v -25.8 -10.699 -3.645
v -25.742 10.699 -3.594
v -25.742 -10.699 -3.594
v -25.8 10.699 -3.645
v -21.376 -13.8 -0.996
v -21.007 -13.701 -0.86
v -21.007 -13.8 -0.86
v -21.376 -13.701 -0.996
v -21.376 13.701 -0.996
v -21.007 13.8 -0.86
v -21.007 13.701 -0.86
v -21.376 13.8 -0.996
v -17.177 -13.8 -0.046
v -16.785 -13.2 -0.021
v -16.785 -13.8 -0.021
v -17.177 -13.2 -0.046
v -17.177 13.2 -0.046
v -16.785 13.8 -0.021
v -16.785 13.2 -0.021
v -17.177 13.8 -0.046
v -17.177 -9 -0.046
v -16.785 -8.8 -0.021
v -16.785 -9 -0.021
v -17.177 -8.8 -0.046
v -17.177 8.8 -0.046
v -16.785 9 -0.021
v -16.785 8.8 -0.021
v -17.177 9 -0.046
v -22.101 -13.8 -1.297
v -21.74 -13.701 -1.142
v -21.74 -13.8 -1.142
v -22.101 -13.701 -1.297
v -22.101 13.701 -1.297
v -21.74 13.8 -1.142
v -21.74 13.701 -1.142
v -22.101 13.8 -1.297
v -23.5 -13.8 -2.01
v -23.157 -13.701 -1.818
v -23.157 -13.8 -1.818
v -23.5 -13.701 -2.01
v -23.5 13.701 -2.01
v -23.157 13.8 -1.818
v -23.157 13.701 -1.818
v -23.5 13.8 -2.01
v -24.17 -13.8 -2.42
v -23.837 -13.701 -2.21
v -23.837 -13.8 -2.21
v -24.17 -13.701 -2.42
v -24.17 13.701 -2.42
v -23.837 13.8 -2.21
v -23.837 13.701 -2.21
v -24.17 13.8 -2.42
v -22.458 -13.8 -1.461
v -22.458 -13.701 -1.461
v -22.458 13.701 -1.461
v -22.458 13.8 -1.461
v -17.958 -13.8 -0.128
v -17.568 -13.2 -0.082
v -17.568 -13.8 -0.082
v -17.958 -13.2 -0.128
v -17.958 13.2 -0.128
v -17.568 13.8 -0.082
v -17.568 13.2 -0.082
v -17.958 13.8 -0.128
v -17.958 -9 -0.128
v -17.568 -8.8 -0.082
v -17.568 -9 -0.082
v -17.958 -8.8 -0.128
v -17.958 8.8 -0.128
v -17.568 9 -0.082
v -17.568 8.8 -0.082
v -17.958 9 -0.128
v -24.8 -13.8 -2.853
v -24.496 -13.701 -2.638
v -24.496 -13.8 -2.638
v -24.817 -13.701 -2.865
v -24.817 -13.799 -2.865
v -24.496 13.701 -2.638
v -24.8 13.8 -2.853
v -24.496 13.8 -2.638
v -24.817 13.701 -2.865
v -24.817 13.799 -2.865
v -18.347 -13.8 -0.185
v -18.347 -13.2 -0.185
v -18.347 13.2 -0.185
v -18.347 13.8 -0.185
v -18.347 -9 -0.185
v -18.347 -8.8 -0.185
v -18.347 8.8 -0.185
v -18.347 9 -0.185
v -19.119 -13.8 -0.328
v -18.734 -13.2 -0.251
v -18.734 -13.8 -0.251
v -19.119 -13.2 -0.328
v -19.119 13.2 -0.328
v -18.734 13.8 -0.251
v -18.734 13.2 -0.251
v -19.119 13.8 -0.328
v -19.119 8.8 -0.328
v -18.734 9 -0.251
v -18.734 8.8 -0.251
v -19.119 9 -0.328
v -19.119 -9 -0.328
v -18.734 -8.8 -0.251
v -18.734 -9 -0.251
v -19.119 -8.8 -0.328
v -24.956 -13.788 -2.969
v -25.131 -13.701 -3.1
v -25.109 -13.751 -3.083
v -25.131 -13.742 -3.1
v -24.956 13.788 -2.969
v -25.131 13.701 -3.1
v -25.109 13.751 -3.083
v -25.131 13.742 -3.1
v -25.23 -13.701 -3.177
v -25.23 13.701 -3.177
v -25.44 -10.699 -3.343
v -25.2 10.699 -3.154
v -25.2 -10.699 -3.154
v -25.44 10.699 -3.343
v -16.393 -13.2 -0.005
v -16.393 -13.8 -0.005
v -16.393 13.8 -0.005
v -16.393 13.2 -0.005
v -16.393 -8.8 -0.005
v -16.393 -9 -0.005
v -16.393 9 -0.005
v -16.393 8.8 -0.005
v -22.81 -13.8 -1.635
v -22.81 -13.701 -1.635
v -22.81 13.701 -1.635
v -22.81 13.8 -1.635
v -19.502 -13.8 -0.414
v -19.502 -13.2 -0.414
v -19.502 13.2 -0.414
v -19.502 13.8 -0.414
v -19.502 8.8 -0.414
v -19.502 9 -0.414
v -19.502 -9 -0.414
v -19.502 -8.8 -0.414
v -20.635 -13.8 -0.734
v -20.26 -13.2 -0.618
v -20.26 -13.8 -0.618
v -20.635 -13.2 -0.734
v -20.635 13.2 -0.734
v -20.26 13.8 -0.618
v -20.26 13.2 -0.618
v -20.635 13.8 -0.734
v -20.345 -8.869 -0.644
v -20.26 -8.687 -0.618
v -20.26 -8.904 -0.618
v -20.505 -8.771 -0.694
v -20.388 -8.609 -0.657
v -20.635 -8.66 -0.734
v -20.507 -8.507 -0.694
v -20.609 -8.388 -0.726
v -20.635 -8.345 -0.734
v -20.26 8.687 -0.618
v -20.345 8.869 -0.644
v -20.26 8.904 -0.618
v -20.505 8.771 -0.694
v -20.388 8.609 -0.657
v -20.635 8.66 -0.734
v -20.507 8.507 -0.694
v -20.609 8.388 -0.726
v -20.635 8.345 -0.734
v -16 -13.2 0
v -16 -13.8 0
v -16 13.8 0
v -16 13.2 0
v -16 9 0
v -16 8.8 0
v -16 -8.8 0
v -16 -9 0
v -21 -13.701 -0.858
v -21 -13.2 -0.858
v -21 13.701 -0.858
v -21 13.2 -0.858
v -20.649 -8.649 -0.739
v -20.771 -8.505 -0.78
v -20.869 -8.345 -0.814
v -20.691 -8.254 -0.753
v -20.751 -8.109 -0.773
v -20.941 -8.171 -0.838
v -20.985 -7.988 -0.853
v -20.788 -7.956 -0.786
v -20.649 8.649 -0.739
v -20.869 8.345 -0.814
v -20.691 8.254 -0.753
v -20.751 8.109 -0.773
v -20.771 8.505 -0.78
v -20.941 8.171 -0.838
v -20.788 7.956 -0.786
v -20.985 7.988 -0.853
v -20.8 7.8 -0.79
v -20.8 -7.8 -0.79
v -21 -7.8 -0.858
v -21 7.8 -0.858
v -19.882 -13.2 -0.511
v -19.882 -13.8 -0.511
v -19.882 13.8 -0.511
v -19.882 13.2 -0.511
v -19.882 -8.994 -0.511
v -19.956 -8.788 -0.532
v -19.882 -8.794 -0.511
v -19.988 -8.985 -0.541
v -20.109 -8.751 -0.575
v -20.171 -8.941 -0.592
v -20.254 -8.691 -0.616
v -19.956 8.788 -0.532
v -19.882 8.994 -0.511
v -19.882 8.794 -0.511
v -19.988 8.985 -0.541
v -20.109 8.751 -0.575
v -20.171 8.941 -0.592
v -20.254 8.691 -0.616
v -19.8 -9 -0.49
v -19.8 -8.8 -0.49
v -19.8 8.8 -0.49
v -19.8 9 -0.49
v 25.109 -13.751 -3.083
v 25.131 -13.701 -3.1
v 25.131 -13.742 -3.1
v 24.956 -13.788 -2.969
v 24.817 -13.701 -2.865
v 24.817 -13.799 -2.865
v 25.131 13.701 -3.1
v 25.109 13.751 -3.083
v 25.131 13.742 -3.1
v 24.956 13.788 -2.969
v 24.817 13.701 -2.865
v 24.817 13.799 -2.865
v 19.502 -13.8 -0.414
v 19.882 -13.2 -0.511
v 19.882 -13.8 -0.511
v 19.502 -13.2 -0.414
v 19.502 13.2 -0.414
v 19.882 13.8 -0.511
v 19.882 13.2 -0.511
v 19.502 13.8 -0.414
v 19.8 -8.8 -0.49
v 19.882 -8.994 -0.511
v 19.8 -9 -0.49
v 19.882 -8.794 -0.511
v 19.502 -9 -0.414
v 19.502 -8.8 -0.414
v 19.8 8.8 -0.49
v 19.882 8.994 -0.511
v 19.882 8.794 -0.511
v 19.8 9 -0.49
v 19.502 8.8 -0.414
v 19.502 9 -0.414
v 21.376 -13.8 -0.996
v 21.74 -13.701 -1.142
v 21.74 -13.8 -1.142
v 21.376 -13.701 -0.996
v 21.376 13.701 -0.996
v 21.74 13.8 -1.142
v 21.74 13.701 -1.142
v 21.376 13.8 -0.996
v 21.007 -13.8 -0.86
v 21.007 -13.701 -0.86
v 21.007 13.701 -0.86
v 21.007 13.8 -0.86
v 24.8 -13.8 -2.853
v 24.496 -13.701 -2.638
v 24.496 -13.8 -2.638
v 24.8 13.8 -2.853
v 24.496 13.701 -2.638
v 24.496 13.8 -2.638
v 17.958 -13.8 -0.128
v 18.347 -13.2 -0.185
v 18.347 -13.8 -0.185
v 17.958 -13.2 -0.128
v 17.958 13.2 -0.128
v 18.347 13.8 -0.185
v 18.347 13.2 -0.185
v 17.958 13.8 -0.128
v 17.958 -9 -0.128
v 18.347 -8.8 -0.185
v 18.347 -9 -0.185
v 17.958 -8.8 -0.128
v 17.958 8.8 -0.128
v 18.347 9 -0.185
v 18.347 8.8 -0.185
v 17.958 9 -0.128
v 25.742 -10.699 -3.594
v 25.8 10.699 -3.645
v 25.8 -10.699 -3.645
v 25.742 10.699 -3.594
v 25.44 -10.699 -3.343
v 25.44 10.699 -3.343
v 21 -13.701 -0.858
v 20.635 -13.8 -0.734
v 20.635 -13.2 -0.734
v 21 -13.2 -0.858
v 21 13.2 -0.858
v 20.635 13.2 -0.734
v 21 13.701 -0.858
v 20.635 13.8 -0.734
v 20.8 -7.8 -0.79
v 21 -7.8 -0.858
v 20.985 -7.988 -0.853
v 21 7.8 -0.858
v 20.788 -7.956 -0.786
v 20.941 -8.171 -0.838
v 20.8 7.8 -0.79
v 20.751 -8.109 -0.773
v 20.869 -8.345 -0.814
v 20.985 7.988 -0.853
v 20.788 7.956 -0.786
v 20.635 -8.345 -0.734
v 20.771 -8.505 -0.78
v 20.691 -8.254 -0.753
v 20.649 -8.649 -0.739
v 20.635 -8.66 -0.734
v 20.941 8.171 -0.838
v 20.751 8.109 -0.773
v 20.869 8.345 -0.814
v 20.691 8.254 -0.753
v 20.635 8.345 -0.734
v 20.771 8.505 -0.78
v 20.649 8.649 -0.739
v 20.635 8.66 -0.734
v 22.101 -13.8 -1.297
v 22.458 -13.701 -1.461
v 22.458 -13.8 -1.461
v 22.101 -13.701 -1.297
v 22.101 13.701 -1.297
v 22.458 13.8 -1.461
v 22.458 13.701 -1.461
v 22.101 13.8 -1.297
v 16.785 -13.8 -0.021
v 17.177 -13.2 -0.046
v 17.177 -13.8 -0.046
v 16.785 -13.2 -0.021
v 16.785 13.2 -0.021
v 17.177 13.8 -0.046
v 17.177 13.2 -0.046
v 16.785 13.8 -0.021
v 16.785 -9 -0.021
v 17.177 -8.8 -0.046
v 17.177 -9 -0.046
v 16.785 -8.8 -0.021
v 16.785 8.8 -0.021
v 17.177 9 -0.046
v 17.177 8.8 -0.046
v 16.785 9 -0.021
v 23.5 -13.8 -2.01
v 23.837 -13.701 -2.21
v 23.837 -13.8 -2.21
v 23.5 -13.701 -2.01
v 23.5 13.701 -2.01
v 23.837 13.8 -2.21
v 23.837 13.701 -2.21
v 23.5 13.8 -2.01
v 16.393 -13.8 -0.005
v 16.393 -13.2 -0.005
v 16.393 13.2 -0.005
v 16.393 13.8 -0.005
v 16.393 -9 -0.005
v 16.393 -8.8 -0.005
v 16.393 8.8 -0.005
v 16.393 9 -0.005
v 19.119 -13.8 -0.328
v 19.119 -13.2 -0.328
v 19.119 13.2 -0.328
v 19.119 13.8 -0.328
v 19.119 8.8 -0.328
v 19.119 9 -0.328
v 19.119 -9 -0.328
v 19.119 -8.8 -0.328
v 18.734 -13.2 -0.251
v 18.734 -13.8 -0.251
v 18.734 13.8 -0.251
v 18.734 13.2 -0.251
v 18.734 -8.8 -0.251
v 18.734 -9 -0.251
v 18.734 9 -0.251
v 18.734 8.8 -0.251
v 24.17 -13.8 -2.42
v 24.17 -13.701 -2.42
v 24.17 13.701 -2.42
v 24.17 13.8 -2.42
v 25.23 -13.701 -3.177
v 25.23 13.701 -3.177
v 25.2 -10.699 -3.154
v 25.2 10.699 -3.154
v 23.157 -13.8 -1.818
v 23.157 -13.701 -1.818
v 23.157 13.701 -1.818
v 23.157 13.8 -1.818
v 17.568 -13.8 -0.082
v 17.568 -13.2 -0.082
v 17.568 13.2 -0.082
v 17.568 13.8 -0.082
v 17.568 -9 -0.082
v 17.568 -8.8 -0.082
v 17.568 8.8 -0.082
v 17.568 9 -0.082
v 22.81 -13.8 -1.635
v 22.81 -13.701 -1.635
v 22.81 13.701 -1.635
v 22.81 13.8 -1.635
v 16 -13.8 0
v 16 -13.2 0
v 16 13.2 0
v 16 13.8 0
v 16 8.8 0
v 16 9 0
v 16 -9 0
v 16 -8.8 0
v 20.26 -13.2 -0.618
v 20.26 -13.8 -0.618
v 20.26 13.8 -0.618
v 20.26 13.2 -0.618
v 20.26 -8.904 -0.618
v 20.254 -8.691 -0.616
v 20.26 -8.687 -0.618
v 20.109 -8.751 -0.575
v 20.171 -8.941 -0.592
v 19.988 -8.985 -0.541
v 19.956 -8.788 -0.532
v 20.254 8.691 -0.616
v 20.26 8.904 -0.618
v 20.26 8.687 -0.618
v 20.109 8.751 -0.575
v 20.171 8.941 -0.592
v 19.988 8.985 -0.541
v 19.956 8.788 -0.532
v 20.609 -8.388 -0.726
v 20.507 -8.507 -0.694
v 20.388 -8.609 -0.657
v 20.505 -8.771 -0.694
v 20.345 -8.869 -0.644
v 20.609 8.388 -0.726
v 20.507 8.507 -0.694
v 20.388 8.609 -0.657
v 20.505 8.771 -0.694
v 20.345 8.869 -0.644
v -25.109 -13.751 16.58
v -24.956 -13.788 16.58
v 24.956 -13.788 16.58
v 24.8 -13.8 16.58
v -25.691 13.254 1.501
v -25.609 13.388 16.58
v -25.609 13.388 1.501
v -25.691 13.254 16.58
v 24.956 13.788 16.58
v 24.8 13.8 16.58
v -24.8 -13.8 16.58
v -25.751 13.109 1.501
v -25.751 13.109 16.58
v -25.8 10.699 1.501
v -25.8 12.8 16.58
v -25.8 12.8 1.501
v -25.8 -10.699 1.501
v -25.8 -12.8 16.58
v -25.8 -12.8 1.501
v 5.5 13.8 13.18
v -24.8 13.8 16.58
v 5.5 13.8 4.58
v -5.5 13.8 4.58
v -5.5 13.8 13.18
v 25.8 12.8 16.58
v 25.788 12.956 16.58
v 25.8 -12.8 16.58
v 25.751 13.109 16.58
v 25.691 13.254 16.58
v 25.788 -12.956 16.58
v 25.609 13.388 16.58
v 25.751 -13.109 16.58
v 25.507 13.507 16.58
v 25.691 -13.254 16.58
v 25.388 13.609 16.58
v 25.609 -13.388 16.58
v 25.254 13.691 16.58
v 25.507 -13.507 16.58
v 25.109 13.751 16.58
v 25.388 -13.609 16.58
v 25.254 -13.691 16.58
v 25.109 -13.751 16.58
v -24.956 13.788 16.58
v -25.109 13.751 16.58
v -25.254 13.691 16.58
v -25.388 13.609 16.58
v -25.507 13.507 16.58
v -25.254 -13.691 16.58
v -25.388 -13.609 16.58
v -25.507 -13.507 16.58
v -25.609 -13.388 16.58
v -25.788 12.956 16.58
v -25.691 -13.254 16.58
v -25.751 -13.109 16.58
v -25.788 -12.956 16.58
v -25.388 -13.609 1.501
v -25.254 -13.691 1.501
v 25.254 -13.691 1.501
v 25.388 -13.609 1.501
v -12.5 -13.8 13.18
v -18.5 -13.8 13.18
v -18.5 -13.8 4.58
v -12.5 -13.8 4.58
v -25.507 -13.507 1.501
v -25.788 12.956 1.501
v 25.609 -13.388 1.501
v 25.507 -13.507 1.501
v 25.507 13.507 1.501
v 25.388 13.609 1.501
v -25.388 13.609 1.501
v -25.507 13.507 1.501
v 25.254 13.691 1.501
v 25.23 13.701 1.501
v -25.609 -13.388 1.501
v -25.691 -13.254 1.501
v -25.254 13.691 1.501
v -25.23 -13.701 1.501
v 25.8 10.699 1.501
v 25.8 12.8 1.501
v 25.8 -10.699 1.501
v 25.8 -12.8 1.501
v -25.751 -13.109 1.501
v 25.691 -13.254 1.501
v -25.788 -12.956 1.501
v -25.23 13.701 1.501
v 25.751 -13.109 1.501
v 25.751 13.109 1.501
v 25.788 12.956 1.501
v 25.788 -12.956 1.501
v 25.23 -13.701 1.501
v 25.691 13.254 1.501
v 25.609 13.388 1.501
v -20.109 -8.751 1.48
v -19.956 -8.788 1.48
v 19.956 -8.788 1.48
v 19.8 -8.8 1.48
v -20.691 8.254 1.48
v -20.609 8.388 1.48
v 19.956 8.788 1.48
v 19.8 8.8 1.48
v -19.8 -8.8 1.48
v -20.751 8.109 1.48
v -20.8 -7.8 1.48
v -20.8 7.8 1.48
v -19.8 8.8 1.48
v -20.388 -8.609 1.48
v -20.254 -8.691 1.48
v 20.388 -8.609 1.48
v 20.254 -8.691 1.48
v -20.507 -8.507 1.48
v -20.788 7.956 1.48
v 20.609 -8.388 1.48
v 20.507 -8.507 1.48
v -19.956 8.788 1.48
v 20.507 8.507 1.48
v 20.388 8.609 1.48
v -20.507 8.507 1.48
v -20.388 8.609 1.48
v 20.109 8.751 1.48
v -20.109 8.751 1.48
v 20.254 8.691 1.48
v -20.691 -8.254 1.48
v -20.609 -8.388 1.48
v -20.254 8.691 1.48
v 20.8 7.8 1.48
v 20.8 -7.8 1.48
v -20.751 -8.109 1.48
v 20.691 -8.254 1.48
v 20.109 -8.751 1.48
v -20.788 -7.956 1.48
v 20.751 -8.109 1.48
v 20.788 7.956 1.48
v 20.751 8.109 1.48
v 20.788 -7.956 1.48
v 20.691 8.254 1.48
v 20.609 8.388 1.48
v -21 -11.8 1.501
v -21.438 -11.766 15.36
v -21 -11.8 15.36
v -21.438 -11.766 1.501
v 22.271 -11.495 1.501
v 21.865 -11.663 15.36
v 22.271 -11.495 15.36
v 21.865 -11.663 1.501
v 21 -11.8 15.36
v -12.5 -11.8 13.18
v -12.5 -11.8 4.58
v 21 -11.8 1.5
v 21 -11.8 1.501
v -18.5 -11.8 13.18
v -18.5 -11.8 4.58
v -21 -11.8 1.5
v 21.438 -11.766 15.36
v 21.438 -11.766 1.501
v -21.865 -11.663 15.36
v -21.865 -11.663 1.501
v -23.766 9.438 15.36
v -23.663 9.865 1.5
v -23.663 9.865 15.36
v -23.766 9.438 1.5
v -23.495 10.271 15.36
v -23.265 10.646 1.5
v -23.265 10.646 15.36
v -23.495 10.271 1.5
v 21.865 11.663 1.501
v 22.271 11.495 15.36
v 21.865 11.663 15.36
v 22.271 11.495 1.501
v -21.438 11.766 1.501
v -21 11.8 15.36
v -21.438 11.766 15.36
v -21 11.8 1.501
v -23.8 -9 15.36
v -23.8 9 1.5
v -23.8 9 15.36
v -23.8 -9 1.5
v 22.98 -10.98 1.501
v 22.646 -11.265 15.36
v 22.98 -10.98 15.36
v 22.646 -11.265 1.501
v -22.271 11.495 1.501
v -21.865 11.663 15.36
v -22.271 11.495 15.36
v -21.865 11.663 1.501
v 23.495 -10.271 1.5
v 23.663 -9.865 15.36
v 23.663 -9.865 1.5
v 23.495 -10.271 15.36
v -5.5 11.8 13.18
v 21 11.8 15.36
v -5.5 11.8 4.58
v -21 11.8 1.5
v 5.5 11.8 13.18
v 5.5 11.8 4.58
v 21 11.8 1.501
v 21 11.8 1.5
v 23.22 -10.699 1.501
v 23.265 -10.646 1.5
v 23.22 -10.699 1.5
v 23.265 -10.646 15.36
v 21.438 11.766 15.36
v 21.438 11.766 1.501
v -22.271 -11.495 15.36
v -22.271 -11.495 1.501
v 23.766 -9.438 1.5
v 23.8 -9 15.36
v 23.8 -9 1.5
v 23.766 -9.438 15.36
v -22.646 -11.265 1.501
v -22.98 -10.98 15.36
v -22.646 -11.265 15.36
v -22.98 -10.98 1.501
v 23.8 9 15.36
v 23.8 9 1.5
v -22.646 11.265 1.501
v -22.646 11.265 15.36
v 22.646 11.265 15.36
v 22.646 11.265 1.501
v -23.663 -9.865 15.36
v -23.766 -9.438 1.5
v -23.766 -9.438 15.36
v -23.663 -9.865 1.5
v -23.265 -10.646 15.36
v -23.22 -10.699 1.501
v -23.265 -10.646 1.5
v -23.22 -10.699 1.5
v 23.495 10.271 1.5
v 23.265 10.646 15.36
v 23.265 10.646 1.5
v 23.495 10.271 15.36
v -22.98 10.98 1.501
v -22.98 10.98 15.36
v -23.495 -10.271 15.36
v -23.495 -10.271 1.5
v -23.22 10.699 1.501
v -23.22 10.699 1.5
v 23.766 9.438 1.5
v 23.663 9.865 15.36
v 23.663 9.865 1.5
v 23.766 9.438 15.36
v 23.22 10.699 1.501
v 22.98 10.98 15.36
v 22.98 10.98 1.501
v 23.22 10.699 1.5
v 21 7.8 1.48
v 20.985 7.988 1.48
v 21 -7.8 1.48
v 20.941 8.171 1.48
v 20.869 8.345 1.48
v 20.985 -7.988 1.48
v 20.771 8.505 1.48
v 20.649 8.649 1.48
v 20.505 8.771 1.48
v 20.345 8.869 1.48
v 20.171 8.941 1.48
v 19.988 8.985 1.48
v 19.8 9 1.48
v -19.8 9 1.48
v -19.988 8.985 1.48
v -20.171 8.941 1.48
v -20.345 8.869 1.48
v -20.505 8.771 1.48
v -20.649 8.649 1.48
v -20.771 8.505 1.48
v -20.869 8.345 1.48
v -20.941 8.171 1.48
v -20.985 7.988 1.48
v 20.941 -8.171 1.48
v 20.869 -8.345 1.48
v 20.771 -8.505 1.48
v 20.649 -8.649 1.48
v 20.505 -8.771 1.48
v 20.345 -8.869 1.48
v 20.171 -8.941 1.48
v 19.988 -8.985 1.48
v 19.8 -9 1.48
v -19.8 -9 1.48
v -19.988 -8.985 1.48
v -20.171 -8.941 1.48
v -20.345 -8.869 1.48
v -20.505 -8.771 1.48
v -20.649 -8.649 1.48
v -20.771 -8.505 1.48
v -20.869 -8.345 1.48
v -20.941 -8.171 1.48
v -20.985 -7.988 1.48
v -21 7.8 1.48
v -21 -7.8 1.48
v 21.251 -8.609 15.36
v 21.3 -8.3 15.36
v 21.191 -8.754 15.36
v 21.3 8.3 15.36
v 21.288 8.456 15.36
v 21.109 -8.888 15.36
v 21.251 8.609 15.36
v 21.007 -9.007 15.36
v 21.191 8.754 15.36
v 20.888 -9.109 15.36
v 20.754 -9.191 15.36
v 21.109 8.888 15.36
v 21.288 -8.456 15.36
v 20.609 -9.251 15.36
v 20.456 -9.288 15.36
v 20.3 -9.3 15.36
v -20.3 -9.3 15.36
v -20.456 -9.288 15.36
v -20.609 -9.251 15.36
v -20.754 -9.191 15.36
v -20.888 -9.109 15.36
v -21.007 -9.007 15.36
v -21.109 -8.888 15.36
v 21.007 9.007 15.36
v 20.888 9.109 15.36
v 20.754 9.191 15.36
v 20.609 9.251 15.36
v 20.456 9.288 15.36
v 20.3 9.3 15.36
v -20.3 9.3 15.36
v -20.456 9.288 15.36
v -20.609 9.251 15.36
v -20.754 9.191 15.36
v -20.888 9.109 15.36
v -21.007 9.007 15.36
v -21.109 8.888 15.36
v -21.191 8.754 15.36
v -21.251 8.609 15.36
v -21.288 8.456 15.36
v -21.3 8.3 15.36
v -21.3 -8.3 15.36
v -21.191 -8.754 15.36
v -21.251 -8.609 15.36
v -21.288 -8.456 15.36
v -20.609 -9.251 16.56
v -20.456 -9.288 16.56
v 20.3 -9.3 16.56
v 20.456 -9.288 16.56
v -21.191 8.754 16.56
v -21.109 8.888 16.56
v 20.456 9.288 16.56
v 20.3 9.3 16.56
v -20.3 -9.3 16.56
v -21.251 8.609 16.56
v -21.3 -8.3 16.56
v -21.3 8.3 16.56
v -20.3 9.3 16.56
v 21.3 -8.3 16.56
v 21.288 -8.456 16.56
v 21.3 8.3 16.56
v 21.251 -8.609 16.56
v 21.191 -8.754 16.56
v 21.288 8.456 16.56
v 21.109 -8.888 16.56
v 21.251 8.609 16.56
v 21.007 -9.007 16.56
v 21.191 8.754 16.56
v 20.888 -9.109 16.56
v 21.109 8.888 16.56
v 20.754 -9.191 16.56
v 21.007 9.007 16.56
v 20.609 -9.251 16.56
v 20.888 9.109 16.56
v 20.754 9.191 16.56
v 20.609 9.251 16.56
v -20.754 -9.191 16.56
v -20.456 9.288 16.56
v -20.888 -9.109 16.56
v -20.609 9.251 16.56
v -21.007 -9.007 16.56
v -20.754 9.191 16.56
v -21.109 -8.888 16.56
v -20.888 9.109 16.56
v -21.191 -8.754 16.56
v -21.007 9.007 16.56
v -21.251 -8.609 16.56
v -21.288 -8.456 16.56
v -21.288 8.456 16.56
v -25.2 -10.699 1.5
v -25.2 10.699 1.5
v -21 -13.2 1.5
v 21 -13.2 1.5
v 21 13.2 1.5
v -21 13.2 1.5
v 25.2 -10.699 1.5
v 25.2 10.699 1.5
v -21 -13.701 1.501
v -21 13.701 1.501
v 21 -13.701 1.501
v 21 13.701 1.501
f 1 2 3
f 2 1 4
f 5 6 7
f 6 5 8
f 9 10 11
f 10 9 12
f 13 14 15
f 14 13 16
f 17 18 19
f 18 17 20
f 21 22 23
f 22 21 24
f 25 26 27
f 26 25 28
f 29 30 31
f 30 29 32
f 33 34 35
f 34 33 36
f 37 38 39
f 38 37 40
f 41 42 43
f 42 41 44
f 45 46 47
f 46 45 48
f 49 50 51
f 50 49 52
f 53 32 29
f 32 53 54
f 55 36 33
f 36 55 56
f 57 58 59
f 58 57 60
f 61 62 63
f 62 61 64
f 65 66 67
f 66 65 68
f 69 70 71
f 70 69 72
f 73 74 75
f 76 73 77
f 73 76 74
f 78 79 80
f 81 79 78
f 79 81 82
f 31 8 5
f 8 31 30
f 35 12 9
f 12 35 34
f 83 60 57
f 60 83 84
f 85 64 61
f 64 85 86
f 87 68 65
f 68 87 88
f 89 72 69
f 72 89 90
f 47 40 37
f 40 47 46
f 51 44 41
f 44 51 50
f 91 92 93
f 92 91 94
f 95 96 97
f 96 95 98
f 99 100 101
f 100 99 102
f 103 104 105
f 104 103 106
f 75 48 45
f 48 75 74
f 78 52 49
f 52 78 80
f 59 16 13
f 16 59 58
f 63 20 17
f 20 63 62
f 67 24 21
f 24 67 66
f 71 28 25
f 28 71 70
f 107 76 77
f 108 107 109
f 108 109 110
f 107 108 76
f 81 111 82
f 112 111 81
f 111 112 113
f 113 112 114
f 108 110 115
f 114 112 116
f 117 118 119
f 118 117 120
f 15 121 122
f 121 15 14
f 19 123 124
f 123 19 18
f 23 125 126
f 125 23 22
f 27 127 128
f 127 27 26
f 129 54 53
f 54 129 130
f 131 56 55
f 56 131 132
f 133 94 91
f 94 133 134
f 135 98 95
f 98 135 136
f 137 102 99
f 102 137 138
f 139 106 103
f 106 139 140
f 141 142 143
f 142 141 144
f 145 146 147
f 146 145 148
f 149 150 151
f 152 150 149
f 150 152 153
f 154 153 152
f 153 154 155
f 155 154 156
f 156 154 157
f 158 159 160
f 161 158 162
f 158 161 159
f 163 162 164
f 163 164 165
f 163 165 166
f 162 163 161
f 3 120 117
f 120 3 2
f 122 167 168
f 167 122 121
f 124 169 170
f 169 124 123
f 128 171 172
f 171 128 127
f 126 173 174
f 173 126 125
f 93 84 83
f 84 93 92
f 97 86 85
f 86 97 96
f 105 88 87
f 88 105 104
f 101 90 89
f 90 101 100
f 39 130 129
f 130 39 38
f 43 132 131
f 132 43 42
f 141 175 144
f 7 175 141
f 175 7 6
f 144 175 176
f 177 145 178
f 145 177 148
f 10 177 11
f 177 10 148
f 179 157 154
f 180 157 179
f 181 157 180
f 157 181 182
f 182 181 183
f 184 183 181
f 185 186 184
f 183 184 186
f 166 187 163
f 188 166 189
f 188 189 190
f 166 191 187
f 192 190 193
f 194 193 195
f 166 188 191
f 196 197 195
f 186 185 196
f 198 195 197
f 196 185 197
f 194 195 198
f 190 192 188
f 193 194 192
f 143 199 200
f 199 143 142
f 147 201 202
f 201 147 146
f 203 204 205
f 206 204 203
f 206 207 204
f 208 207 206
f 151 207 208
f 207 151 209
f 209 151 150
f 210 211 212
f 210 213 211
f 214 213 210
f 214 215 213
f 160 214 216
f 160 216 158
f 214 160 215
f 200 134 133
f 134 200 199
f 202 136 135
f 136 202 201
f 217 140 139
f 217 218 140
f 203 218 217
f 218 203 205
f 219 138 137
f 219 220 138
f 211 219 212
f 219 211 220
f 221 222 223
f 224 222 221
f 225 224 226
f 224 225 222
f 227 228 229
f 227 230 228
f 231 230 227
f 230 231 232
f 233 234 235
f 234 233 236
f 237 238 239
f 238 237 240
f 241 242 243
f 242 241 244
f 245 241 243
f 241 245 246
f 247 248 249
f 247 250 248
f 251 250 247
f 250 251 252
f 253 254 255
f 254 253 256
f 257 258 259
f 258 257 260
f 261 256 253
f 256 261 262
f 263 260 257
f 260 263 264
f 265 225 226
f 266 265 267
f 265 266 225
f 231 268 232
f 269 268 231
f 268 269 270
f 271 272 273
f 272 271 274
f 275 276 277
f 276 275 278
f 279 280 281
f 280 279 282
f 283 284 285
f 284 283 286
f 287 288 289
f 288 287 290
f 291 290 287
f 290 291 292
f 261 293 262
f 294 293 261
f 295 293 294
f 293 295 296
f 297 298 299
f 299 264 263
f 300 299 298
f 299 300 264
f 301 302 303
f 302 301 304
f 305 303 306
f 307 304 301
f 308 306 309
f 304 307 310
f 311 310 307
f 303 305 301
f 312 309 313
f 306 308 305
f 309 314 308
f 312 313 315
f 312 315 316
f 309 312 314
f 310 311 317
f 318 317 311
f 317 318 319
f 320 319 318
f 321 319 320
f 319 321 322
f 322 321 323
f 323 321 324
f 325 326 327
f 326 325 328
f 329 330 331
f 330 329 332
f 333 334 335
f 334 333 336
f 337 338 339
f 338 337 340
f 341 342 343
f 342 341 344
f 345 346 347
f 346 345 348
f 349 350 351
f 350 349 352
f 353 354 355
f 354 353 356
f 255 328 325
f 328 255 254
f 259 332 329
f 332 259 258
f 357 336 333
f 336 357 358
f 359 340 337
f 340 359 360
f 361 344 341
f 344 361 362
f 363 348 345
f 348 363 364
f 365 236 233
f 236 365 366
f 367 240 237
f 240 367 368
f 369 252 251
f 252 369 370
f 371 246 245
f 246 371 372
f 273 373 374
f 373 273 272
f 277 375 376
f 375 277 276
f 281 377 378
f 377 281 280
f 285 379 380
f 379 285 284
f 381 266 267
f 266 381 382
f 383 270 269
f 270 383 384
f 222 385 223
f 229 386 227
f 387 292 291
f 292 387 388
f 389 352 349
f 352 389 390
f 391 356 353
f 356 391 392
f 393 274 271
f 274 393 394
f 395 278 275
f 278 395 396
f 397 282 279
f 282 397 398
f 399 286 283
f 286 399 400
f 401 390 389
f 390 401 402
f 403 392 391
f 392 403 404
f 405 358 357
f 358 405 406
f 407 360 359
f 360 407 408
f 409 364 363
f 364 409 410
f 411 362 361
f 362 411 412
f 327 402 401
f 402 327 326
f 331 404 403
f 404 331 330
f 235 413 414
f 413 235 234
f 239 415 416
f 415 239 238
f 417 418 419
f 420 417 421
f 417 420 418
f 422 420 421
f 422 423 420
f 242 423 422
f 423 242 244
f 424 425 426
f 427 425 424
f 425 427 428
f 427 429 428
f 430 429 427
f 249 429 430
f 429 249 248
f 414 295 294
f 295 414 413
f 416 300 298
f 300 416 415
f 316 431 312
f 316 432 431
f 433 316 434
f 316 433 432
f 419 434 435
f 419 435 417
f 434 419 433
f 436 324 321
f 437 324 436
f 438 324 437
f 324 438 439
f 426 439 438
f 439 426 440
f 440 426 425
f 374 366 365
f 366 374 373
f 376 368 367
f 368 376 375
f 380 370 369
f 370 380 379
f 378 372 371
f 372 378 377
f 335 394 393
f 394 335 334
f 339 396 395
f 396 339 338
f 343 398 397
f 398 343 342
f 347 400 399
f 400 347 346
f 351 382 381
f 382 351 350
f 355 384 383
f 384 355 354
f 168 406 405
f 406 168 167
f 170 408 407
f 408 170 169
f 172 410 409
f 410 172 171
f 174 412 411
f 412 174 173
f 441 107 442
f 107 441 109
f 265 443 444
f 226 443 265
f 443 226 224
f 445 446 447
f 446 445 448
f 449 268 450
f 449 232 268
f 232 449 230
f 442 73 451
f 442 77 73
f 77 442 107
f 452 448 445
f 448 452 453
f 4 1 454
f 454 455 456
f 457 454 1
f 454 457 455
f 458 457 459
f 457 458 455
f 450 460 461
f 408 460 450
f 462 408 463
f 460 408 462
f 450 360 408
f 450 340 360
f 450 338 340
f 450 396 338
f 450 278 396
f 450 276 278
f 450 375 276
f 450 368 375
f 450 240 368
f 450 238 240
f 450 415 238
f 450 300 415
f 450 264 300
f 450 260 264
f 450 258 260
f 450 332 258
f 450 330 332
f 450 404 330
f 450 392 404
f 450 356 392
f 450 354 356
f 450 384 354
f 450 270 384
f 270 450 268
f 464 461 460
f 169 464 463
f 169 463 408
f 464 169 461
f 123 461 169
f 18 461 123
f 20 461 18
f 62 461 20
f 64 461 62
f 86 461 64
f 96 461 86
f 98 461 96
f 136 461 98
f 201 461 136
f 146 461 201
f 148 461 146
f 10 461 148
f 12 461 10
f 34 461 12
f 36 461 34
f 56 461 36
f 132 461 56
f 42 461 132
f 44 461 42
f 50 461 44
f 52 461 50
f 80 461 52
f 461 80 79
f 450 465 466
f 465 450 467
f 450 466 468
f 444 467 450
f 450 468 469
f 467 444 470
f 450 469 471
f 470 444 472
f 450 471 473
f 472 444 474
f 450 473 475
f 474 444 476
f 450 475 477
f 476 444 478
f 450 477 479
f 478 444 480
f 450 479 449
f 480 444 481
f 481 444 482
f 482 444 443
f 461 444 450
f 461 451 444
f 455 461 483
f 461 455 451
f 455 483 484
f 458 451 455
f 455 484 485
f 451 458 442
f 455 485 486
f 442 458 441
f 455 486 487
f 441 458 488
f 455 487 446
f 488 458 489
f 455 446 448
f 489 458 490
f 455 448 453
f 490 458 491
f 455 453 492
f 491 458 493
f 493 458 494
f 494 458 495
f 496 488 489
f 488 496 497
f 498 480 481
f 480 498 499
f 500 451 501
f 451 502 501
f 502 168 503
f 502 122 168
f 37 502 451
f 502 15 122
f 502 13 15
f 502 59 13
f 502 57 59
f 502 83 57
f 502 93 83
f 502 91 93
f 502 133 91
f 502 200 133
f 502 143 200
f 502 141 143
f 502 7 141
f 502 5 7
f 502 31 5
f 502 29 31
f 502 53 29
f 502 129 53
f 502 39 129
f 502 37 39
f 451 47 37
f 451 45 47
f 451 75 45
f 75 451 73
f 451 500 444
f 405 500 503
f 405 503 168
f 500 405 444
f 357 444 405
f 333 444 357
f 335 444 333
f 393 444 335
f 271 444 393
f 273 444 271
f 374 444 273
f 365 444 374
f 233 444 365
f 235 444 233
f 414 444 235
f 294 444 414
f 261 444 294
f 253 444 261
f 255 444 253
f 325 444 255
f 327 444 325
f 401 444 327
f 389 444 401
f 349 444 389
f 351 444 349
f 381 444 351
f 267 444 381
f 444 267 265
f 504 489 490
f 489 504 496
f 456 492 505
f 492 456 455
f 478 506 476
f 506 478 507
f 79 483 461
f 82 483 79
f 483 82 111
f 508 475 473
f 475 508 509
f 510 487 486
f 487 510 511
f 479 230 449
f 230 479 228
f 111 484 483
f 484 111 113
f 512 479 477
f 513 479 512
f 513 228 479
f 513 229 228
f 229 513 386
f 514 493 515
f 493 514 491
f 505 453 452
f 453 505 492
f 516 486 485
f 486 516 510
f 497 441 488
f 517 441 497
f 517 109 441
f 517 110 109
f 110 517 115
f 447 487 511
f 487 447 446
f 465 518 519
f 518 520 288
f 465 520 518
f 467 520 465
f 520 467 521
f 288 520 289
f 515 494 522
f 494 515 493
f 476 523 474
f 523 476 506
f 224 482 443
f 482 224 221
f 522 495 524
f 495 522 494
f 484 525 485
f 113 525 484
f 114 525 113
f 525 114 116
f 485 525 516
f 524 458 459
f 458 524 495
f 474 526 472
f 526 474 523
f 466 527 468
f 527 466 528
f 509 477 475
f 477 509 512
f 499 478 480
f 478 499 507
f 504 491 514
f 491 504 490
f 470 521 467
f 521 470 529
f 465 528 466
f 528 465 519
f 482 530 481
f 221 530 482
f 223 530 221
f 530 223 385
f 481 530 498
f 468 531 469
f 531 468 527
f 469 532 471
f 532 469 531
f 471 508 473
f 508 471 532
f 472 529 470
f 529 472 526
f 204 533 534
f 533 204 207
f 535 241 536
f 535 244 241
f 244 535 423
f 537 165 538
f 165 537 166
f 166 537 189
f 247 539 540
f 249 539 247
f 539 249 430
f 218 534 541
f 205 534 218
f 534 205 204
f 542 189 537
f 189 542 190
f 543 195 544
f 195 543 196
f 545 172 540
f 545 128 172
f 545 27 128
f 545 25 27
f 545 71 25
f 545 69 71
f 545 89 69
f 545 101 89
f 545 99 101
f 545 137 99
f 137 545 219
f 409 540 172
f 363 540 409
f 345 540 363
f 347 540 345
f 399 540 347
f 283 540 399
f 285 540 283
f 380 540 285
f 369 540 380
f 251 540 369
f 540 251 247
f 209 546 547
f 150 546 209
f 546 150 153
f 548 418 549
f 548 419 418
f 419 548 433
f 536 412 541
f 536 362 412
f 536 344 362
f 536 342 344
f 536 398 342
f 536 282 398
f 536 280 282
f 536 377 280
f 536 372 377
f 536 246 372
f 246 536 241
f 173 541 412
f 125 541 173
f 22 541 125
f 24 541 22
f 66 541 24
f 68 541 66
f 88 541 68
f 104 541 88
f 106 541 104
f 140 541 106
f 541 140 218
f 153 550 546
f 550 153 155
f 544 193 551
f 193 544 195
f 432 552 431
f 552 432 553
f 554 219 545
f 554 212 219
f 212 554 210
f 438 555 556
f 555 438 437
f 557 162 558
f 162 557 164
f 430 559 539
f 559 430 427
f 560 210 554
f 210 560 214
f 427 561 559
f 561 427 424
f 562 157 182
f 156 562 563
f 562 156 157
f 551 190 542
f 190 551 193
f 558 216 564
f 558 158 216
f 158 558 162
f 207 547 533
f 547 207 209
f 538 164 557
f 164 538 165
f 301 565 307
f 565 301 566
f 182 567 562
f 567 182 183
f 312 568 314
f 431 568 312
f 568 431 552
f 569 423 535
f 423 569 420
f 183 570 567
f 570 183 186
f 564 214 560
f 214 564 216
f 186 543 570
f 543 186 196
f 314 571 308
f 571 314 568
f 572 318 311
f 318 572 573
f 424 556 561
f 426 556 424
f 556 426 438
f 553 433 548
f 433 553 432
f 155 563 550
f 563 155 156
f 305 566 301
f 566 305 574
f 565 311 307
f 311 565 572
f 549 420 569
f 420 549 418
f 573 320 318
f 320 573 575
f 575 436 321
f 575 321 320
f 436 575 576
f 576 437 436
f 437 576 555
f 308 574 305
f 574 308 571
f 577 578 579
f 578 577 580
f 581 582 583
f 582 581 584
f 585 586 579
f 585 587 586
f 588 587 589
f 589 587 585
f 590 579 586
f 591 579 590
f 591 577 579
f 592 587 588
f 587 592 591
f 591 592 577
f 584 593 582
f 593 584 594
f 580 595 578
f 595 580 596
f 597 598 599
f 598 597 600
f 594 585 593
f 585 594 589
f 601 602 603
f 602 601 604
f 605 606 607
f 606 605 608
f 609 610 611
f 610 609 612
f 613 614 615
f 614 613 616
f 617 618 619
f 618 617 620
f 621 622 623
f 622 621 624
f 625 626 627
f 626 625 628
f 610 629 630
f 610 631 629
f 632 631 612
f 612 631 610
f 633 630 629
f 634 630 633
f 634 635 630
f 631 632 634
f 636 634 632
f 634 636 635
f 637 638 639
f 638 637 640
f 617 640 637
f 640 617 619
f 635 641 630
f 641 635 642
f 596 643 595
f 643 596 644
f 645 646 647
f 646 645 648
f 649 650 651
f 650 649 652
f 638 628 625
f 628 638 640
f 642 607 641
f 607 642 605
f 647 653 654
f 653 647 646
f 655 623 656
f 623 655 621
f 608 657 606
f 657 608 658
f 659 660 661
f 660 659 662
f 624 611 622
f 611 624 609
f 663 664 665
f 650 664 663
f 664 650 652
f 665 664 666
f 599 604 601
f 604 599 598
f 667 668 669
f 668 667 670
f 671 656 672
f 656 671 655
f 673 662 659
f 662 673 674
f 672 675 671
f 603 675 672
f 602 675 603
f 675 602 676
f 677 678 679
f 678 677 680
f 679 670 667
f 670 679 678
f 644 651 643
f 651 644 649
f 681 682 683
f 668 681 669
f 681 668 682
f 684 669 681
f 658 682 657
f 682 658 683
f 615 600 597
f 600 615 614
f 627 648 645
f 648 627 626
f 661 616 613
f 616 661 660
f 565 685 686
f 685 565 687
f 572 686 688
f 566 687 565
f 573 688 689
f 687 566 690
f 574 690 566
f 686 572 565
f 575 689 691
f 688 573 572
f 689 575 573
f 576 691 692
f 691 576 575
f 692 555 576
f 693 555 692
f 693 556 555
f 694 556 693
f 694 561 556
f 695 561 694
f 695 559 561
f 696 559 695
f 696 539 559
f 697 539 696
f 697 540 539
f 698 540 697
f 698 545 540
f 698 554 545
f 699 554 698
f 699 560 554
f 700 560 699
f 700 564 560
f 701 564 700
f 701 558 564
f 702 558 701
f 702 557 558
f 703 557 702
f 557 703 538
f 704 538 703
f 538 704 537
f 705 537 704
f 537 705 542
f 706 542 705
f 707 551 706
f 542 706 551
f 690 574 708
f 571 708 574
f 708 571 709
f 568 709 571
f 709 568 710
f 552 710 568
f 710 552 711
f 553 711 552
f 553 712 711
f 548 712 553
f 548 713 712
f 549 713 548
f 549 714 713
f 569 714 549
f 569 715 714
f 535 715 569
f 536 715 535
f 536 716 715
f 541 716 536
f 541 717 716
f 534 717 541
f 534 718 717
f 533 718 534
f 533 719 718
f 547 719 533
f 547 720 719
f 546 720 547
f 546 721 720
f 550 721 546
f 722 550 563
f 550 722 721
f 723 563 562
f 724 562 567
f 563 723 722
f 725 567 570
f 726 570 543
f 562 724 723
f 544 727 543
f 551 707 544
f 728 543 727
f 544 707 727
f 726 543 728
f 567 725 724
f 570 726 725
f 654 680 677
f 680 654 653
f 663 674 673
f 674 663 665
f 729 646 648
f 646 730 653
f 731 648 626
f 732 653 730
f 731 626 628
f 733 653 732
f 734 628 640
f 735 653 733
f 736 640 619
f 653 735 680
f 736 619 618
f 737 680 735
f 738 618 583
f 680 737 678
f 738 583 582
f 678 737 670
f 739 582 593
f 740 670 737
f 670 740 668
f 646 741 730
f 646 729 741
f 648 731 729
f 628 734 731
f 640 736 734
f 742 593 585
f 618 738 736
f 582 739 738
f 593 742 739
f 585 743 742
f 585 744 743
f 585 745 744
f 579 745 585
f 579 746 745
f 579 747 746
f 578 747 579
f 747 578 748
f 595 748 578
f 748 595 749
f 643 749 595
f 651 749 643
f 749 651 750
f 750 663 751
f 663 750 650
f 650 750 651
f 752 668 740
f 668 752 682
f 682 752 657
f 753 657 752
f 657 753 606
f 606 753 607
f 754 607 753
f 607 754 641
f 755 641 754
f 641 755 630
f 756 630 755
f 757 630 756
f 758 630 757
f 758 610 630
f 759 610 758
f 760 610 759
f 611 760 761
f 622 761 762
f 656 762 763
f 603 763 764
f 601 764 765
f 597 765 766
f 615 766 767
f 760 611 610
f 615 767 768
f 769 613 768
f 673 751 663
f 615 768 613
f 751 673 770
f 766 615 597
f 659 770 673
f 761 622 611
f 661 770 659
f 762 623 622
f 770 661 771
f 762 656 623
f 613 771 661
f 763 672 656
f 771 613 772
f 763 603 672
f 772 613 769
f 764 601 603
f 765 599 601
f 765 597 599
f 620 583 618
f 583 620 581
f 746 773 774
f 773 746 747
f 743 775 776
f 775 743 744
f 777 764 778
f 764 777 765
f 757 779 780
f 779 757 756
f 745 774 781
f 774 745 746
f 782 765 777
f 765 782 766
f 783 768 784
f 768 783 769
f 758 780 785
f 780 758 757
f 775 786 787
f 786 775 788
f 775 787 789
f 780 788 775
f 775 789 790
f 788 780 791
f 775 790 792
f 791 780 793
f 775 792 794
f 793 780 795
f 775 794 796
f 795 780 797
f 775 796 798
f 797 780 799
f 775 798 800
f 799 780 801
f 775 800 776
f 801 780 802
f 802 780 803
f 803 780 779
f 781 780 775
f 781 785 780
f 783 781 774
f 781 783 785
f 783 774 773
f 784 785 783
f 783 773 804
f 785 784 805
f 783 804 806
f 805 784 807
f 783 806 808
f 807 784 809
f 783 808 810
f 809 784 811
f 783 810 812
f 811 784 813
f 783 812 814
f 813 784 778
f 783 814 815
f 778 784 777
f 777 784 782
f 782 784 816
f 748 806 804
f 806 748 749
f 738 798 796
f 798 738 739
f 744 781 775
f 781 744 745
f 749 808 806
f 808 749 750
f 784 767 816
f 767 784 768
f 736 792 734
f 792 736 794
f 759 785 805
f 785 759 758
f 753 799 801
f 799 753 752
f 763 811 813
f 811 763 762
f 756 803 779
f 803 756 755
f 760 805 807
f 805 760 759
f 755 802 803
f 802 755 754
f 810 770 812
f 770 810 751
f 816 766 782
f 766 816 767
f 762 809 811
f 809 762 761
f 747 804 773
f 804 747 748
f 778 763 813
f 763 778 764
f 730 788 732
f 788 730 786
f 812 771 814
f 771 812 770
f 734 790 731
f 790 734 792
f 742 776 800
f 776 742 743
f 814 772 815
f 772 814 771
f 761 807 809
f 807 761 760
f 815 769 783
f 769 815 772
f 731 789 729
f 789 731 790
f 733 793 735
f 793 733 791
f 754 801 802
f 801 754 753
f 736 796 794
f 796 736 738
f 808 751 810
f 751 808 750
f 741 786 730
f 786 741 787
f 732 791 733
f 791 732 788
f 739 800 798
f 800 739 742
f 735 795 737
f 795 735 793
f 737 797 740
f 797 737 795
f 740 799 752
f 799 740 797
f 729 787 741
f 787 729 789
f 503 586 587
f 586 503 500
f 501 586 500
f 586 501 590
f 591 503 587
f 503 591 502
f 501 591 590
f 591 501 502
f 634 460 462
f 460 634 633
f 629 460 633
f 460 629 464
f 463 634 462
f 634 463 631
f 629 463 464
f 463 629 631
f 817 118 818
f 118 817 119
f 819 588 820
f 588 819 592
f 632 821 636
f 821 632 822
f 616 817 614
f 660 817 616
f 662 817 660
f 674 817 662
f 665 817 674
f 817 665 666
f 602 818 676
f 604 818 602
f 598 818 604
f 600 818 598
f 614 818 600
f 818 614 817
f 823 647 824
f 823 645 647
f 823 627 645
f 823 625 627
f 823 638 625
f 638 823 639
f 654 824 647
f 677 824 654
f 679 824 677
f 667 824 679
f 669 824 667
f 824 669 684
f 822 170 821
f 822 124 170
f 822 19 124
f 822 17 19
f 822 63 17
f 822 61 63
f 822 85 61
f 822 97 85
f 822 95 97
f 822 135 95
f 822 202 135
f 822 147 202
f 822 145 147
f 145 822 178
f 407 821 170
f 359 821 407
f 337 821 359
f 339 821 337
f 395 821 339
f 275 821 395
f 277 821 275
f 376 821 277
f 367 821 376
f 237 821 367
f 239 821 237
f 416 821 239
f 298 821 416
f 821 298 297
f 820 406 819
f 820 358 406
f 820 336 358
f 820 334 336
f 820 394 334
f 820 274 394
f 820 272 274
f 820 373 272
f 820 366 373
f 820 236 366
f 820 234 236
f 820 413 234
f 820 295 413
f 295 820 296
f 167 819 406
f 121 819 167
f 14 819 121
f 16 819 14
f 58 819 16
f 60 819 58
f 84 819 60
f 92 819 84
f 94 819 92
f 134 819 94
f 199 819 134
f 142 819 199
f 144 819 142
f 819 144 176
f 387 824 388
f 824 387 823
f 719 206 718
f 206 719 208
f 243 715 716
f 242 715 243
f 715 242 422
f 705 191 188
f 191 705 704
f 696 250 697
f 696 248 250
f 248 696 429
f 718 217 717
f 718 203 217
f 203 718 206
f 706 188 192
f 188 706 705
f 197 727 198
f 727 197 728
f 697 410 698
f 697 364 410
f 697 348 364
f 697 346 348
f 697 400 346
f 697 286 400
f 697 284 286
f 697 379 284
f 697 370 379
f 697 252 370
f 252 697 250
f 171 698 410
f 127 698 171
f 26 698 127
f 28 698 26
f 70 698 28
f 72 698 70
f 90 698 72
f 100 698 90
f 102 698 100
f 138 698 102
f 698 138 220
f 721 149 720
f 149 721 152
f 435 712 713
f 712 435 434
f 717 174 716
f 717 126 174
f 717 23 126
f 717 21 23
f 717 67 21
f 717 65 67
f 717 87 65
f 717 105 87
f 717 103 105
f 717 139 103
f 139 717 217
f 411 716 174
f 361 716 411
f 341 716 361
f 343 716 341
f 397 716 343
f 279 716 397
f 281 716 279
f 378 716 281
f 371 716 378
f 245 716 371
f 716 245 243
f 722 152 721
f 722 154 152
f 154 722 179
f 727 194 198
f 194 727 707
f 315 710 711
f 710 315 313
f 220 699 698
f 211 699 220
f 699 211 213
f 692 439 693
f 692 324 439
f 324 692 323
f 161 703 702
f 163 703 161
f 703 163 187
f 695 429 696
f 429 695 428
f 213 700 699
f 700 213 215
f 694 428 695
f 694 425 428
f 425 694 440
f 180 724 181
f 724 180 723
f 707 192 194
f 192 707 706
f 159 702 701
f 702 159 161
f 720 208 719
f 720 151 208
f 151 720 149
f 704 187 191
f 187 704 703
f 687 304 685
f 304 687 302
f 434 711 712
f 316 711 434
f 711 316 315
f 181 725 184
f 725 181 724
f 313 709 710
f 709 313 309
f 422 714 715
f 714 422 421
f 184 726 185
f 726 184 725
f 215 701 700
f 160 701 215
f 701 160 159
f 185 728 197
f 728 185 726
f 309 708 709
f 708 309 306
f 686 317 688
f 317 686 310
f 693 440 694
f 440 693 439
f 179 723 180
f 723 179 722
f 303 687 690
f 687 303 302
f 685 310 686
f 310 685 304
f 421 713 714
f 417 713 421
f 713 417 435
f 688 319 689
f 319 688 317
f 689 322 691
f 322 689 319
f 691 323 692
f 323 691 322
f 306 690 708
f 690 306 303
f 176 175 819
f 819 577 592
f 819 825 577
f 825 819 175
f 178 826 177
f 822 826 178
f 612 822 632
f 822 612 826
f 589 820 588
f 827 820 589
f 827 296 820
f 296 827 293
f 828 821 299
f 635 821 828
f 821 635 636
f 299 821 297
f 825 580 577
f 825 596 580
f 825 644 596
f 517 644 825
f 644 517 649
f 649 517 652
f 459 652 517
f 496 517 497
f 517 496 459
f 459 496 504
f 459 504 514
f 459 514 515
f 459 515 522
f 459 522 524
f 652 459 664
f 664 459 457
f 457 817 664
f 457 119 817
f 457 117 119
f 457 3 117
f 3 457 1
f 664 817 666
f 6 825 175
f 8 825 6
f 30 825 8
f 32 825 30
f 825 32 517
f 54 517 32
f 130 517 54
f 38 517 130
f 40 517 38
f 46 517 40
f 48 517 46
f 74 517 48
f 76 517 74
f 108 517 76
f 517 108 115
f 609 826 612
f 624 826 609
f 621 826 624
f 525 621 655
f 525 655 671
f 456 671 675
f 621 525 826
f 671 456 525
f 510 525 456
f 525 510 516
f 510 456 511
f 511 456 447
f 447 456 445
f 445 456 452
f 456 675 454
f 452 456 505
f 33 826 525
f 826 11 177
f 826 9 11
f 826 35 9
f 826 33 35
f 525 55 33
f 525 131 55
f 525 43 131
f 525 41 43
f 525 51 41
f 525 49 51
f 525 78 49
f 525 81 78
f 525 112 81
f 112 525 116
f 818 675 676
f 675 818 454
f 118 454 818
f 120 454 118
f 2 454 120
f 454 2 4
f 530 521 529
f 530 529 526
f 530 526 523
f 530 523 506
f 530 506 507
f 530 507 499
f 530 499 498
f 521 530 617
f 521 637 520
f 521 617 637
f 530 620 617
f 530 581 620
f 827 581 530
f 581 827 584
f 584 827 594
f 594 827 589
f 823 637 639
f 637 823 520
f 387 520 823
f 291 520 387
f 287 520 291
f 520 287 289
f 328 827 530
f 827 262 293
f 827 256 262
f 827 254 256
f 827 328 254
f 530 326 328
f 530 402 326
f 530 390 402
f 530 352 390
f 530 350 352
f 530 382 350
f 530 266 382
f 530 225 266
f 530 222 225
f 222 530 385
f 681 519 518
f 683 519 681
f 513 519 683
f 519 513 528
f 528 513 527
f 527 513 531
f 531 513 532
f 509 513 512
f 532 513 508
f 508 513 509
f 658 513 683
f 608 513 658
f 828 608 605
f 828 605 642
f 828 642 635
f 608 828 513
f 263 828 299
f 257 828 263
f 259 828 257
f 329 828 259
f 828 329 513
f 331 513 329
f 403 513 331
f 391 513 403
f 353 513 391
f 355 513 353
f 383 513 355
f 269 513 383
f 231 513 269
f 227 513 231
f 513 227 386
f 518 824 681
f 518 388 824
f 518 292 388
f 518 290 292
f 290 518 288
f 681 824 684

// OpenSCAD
// Silicone sleeve for the M5Stack StickS3 with a cast-in PETG lug frame, so a
// standard 22 mm watch strap (Tropic etc.) attaches with spring bars.
// Same pocket as the band (hardware/band), same 16.6 mm thickness.
//
// Parts (set `part`, or use the Customizer):
//   "frame"        PETG, print as exported: its flat top face is on the bed, the curved side
//                  is up, NO supports needed. 4 walls, 100% infill. Cast into the sleeve.
//   "core"         PLA, as exported (on its side); needs SUPPORTS (build plate only):
//                  the side ribs that form the button openings hold it off the bed.
//   "mold_bottom"  PLA, as exported; shallow tray the frame and core sit in.
//   "mold_top"     PLA, as exported (cavity opening down is NOT printable) -> exported
//                  cavity-up; print as exported. Has the side pour hole and top vents.
//   "sleeve"       preview of the finished silicone part (don't print).
//
// Coordinates: x along the Stick's length (USB-C end at -x), y across its width,
// z from the back (wrist side, z = 0) to the front. The mold parts at z = back_t.
//
// Casting: same as the band (docs/build-notes.md), except:
//   1. Drop the frame into the bottom tray, horns in their slots.
//   2. Stand the core in the frame's opening, back pad down, ribs toward the
//      long sides. Close the top half over it, 4x M3x30 + nuts.
//   3. Inject through the side pour hole (low on one long side) until silicone
//      shows at all 8 top vents. ~11 ml of silicone; mix 25 g total.

/* [Part] */
part = "sleeve"; // [frame, core, mold_bottom, mold_top, sleeve]

/* [Strap] */
// Inside gap between the lug horns (strap end is 21 mm)
lug_gap = 21.4;
// Spring-bar centre, this far out from the sleeve's end wall
bar_out = 2.0;
// The back is flat in the middle, then curves down toward the wrist on an arc of this
// radius, starting this far from the centre. Starting under the Stick means the flat
// Stick rests on the middle and a silicone wedge fills under its ends; the sleeve,
// frame and horns all wrap the wrist. Horns must stay short of curve_start + curve_R.
curve_R = 15;
curve_start = 16.0;
bar_hole_d = 1.0;

/* [Fit] */
// Stick is this much bigger than the pocket, per side (0.1 looser, 0.2 default, 0.3 tighter)
squeeze = 0.2;

/* [Hidden] */
$fn = 40;
eps = 0.01;

// ---- StickS3 (K150) ------------------------------------------------------
STICK_W = 24; STICK_L = 48; STICK_T = 14.08; STICK_R = 3;
BTN_XMINUS = [6.0, 11.0];     // power/reset side, from the USB-C end
BTN_XPLUS  = [19.0, 29.0];    // KEY2 side
BTN_Z = [3.6, 11.2];          // above the Stick's back

// ---- Pocket (identical to the band) --------------------------------------
wall = 2.0; front_lip = 2.5; front_t = 1.2; back_lip = 3.0; back_t = 1.5; btn_margin = 0.5;
NOM = 0.2;
CORE_L = STICK_L - 2 * squeeze;  CORE_W = STICK_W - 2 * squeeze;  CORE_T = STICK_T - squeeze;
CORE_R = STICK_R - squeeze;
CORE_L_NOM = STICK_L - 2 * NOM;  CORE_W_NOM = STICK_W - 2 * NOM;
POCKET_L = CORE_L_NOM + 2 * wall;  POCKET_W = CORE_W_NOM + 2 * wall;
POCKET_T = back_t + STICK_T - NOM + front_t;
POCKET_R = 1.0;                 // small corners so the lug horns clear them
Z_CORE0 = back_t;  Z_CORE1 = back_t + CORE_T;
FRONT_WIN = [CORE_L_NOM - 2 * front_lip, CORE_W_NOM - 2 * front_lip];
BACK_WIN  = [CORE_L_NOM - 2 * back_lip,  CORE_W_NOM - 2 * back_lip];

// ---- Frame ------------------------------------------------------------------
skin = 0.6;                     // silicone over the frame's outer edge
frame_t = back_t;               // frame is the whole back wall; bottom face exposed
frame_clear = 0.2;              // frame opening around the core's back pad
horn_t = 3.0;                   // inside the sleeve's end wall
horn_flare = 1.0;               // extra thickness outward, only outside the sleeve
horn_h = back_t;                // horns never rise above the frame's flat top (prints support-free)
horn_tip_r = 2.2;               // material around the bar hole: 1.7 mm
horn_len = bar_out + horn_tip_r; // beyond the sleeve end
horn_y = lug_gap / 2 + horn_t / 2;
// The horn stands at full height from just past the core's rounded corner, so
// its root runs the whole end wall (about 2.3 mm) instead of a 1 mm stub.
HORN_X0 = curve_start + 5.0;    // horn root runs along the thick end of the ring
HORN_X1 = POCKET_L / 2 + horn_len;
BAR_X = POCKET_L / 2 + bar_out;
// how far the back surface has dropped below z = 0 at |x|
function drop(x) = abs(x) <= curve_start ? 0 : curve_R - sqrt(curve_R * curve_R - pow(abs(x) - curve_start, 2));
BAR_Z = -drop(BAR_X) + horn_tip_r;      // tip circle sits on the curve
assert(curve_start >= 8, "curve must leave a flat middle for the Stick to rest on");
// the tray must hold the sleeve's curved ends and the horn's lowest point (under the bar);
// beyond the bar the horn is its rounded tip, which stays above the arc
assert(drop(POCKET_L / 2) < bottom_t - back_t - 2, "sleeve ends reach through the bottom tray");
assert(BAR_Z - horn_tip_r - slot_clear > -(bottom_t - back_t) + 1, "horn tips reach through the bottom tray");
assert(curve_R + eps >= HORN_X1 - curve_start, "curve too tight: it turns vertical before the horn tips");
assert(horn_y + horn_t / 2 <= POCKET_W / 2 - 0.1, "lug horns wider than the sleeve");

// ---- Mold ----------------------------------------------------------------
slot_clear = 0.15;
bottom_t = 9.0;                 // bottom tray; deep enough for the down-turned horn tips
bolt_head_pocket = 2.5;         // recess for the bolt heads on the top half, so M3x30 reaches
top_floor = 4.0;                // material above the cavity ceiling
margin = 8.5;
MX = HORN_X1 + slot_clear + margin;          // mold half-length
MY = POCKET_W / 2 + margin;                  // mold half-width
TOP_H = POCKET_T - back_t + top_floor;
bolt_d = 3.4;
BOLTS = [[-(MX - 5), -(MY - 5)], [MX - 5, -(MY - 5)], [-(MX - 5), MY - 5], [MX - 5, MY - 5]];
PINS = [[-12, -(MY - 4)], [12, MY - 4]];   // diagonal, so the top only fits one way
VENTS = [[-(POCKET_L / 2 - 2.3), -(POCKET_W / 2 - 2.3)], [POCKET_L / 2 - 2.3, -(POCKET_W / 2 - 2.3)],
         [-(POCKET_L / 2 - 2.3), POCKET_W / 2 - 2.3], [POCKET_L / 2 - 2.3, POCKET_W / 2 - 2.3],
         [0, -(POCKET_W / 2 - 1.2)], [0, POCKET_W / 2 - 1.2],
         [-(POCKET_L / 2 - 1.2), 0], [POCKET_L / 2 - 1.2, 0]];
vent_d = 1.5;
sprue_d = 3.5;
SPRUE = [10, 3.5];              // x position and z height of the side pour hole (-y side)

echo(str("Sleeve ", POCKET_L, " x ", POCKET_W, " x ", POCKET_T, " mm; lug gap ", lug_gap,
         "; bar at ", bar_out, " out, z=", BAR_Z, "; curve R", curve_R, " from x=", curve_start, "; mold ", 2 * MX, " x ", 2 * MY,
         ", bottom ", bottom_t, " + top ", TOP_H, " = ", bottom_t + TOP_H, " mm, ",
         bottom_t + TOP_H - bolt_head_pocket, " mm through the bolts (M3x30)"));

module rrect(l, w, r) { offset(r = r) square([l - 2 * r, w - 2 * r], center = true); }
module rbox(l, w, r, z0, z1) { translate([0, 0, z0]) linear_extrude(z1 - z0) rrect(l, w, r); }

// ---- Pieces -----------------------------------------------------------------
// Solid region above the curved back surface (flat for |x| <= curve_start, then the arc).
// `r` and `z0` let the same shape describe the frame's top surface (offset inward).
// The curve is convex (a wrist): the arc is the top of a circle of radius curve_R whose
// centre is curve_R below the flat back, at x = +/-curve_start. "Above" it = outside that
// circle. A larger r (curve_R + t) gives the parallel surface t above it.
module above_curve(r = curve_R, z0 = 0) {
    translate([-curve_start, -100, z0]) cube([2 * curve_start, 200, 60]);
    for (sx = [-1, 1]) difference() {
        translate([sx > 0 ? curve_start : -curve_start - 60, -100, -curve_R]) cube([60, 200, 60 + curve_R]);
        translate([sx * curve_start, 0, -curve_R]) rotate([90, 0, 0]) cylinder(r = r, h = 201, center = true, $fn = 240);
    }
}
module pocket_body() { intersection() { rbox(POCKET_L, POCKET_W, POCKET_R, -10, POCKET_T); above_curve(); } }

module core_block() {
    rbox(CORE_L, CORE_W, CORE_R, Z_CORE0, Z_CORE1);
    rbox(FRONT_WIN[0], FRONT_WIN[1], 1.0, Z_CORE1 - eps, POCKET_T);   // fills the screen window
    intersection() {                                                   // fills the back window,
        rbox(BACK_WIN[0], BACK_WIN[1], 1.0, -10, Z_CORE0 + eps);        // down to the curved back
        above_curve();
    }
}

// ribs on the core reach the cavity wall and leave the side-button openings
module core_ribs(grow = 0) {
    z0 = back_t + BTN_Z[0] - btn_margin - grow;
    z1 = back_t + BTN_Z[1] + btn_margin + grow;
    xm = [BTN_XMINUS[0] - STICK_L / 2 - btn_margin - grow, BTN_XMINUS[1] - STICK_L / 2 + btn_margin + grow];
    xp = [BTN_XPLUS[0]  - STICK_L / 2 - btn_margin - grow, BTN_XPLUS[1]  - STICK_L / 2 + btn_margin + grow];
    translate([xm[0], -POCKET_W / 2 - grow, z0]) cube([xm[1] - xm[0], POCKET_W / 2 - CORE_W / 2 + 1 + grow, z1 - z0]);
    translate([xp[0],  CORE_W / 2 - 1, z0])      cube([xp[1] - xp[0], POCKET_W / 2 - CORE_W / 2 + 1 + grow, z1 - z0]);
}

module core_part() { core_block(); core_ribs(); }

// one lug horn: a plate in the x-z plane, rounded around the spring-bar hole.
// Outside the sleeve it thickens outward (away from the strap) for strength.
// The profile is drawn generously deep, then cut to the curved back surface, so the
// horn's underside follows the wrist curve and its top tapers straight to the bar.
module horn_profile(sx, grow, x0) {
    hull() {
        // rect bottom sits at the arc's depth under the bar, so past the bar the horn is only
        // its rounded tip and doesn't grow a heel that follows the plunging arc into the wrist
        translate([sx > 0 ? x0 : -BAR_X, -drop(BAR_X) - grow]) square([BAR_X - x0, drop(BAR_X) + horn_h + 2 * grow]);
        translate([sx * BAR_X, BAR_Z]) circle(r = horn_tip_r + grow);
    }
}
module horn(sx, sy, grow = 0) {
    intersection() {
        union() {
            translate([0, sy * horn_y, 0]) rotate([90, 0, 0]) translate([0, 0, -(horn_t / 2 + grow)])
                linear_extrude(horn_t + 2 * grow) horn_profile(sx, grow, HORN_X0);
            // flared section, starts 0.2 mm past the sleeve's end so it never sits in the silicone
            translate([0, sy * (horn_y + horn_flare / 2), 0]) rotate([90, 0, 0]) translate([0, 0, -(horn_t / 2 + horn_flare / 2 + grow)])
                linear_extrude(horn_t + horn_flare + 2 * grow) horn_profile(sx, grow, POCKET_L / 2 + 0.2);
        }
        translate([0, 0, -grow]) above_curve();
    }
}
module horns(grow = 0) { for (sx = [-1, 1], sy = [-1, 1]) horn(sx, sy, grow); }

module frame_part() {
    difference() {
        union() {
            intersection() {
                difference() {
                    rbox(POCKET_L - 2 * skin, POCKET_W - 2 * skin, max(POCKET_R - skin, 0.4), -10, frame_t);
                    rbox(BACK_WIN[0] + 2 * frame_clear, BACK_WIN[1] + 2 * frame_clear, 1.0 + frame_clear, -11, 11);
                }
                // flat top at frame_t (the Stick's back plane), curved underside: the ring
                // thickens toward the ends, so it prints upside down without supports
                above_curve();
            }
            horns();
        }
        for (sx = [-1, 1]) translate([sx * BAR_X, 0, BAR_Z]) rotate([90, 0, 0]) cylinder(d = bar_hole_d, h = 100, center = true, $fn = 16);
    }
}

// everything the silicone fills
module silicone() {
    difference() {
        pocket_body();
        // the core's back plane and the frame's top coincide; nudge the core so the
        // preview mesh stays a clean solid instead of growing zero-thickness slivers
        translate([0, 0, -0.02]) core_part();
        frame_part();
        horns(0.001);
    }
}

// ---- Mold halves -------------------------------------------------------------
module mold_bottom() {
    difference() {
        translate([0, 0, back_t - bottom_t]) linear_extrude(bottom_t) rrect(2 * MX, 2 * MY, 4);
        // tray: pocket outline down to the curved back surface (frame, core back pad and skin sit in it)
        intersection() { rbox(POCKET_L, POCKET_W, POCKET_R, -10, back_t + 1); above_curve(); }
        // horn slots, only outside the sleeve outline: inside it the tray floor already
        // follows the curve the horns sit on, and clearance there would let a film of
        // silicone creep under the horn roots
        // Horn slots with clearance, from 1.5 mm inside the sleeve's end outward. Inside
        // the outline the horns already rest on the curved tray floor; the slot only needs
        // to cover the rounded outline corners the horns pass through. (An exact-fit cut
        // would put coincident faces in the mesh; a 0.15 mm film under 1.5 mm of horn root
        // trims off in a second.)
        intersection() {
            horns(slot_clear);
            union() {
                translate([POCKET_L / 2 - 1.5, -50, -50]) cube([50, 100, 100]);
                translate([-POCKET_L / 2 + 1.5 - 50, -50, -50]) cube([50, 100, 100]);
            }
        }
        for (b = BOLTS) translate([b[0], b[1], -10]) cylinder(d = bolt_d, h = 40);
        for (p = PINS) translate([p[0], p[1], back_t - 4.5]) cylinder(d = 5.4, h = 4.5 + eps);
    }
    // alignment pins go on the top half so the bottom stays a flat, easy print
}

module mold_top() {
    difference() {
        translate([0, 0, back_t]) linear_extrude(TOP_H) rrect(2 * MX, 2 * MY, 4);
        // cavity above the parting plane
        rbox(POCKET_L, POCKET_W, POCKET_R, back_t - eps, POCKET_T);
        // upper part of the horn slots, open to the parting face
        horns(slot_clear);
        for (b = BOLTS) {
            translate([b[0], b[1], -10]) cylinder(d = bolt_d, h = 60);
            translate([b[0], b[1], back_t + TOP_H - bolt_head_pocket]) cylinder(d = 6.6, h = bolt_head_pocket + 1);
        }
        // vents from the top face down into the lip ring
        for (v = VENTS) translate([v[0], v[1], POCKET_T - 0.3]) cylinder(d = vent_d, h = top_floor + 1, $fn = 12);
        // side pour hole, low on the -y long side, with a funnel
        translate([SPRUE[0], -(POCKET_W / 2) + 0.3, SPRUE[1]]) rotate([90, 0, 0]) cylinder(d = sprue_d, h = MY);
        translate([SPRUE[0], -MY - eps, SPRUE[1]]) rotate([-90, 0, 0]) cylinder(d1 = sprue_d + 5, d2 = sprue_d, h = 2.5);
    }
    for (p = PINS) translate([p[0], p[1], back_t + eps]) mirror([0, 0, 1]) cylinder(d1 = 5, d2 = 4, h = 4);
}

if (part == "frame") translate([0, 0, back_t]) rotate([180, 0, 0]) frame_part();   // flat top face down
else if (part == "core") translate([0, 0, POCKET_W / 2]) rotate([90, 0, 0]) core_part();    // -y face down
else if (part == "mold_bottom") translate([0, 0, bottom_t - back_t]) mold_bottom();          // flat face down
else if (part == "mold_top") translate([0, 0, TOP_H + back_t]) rotate([180, 0, 0]) mold_top(); // parting face up
else silicone();
